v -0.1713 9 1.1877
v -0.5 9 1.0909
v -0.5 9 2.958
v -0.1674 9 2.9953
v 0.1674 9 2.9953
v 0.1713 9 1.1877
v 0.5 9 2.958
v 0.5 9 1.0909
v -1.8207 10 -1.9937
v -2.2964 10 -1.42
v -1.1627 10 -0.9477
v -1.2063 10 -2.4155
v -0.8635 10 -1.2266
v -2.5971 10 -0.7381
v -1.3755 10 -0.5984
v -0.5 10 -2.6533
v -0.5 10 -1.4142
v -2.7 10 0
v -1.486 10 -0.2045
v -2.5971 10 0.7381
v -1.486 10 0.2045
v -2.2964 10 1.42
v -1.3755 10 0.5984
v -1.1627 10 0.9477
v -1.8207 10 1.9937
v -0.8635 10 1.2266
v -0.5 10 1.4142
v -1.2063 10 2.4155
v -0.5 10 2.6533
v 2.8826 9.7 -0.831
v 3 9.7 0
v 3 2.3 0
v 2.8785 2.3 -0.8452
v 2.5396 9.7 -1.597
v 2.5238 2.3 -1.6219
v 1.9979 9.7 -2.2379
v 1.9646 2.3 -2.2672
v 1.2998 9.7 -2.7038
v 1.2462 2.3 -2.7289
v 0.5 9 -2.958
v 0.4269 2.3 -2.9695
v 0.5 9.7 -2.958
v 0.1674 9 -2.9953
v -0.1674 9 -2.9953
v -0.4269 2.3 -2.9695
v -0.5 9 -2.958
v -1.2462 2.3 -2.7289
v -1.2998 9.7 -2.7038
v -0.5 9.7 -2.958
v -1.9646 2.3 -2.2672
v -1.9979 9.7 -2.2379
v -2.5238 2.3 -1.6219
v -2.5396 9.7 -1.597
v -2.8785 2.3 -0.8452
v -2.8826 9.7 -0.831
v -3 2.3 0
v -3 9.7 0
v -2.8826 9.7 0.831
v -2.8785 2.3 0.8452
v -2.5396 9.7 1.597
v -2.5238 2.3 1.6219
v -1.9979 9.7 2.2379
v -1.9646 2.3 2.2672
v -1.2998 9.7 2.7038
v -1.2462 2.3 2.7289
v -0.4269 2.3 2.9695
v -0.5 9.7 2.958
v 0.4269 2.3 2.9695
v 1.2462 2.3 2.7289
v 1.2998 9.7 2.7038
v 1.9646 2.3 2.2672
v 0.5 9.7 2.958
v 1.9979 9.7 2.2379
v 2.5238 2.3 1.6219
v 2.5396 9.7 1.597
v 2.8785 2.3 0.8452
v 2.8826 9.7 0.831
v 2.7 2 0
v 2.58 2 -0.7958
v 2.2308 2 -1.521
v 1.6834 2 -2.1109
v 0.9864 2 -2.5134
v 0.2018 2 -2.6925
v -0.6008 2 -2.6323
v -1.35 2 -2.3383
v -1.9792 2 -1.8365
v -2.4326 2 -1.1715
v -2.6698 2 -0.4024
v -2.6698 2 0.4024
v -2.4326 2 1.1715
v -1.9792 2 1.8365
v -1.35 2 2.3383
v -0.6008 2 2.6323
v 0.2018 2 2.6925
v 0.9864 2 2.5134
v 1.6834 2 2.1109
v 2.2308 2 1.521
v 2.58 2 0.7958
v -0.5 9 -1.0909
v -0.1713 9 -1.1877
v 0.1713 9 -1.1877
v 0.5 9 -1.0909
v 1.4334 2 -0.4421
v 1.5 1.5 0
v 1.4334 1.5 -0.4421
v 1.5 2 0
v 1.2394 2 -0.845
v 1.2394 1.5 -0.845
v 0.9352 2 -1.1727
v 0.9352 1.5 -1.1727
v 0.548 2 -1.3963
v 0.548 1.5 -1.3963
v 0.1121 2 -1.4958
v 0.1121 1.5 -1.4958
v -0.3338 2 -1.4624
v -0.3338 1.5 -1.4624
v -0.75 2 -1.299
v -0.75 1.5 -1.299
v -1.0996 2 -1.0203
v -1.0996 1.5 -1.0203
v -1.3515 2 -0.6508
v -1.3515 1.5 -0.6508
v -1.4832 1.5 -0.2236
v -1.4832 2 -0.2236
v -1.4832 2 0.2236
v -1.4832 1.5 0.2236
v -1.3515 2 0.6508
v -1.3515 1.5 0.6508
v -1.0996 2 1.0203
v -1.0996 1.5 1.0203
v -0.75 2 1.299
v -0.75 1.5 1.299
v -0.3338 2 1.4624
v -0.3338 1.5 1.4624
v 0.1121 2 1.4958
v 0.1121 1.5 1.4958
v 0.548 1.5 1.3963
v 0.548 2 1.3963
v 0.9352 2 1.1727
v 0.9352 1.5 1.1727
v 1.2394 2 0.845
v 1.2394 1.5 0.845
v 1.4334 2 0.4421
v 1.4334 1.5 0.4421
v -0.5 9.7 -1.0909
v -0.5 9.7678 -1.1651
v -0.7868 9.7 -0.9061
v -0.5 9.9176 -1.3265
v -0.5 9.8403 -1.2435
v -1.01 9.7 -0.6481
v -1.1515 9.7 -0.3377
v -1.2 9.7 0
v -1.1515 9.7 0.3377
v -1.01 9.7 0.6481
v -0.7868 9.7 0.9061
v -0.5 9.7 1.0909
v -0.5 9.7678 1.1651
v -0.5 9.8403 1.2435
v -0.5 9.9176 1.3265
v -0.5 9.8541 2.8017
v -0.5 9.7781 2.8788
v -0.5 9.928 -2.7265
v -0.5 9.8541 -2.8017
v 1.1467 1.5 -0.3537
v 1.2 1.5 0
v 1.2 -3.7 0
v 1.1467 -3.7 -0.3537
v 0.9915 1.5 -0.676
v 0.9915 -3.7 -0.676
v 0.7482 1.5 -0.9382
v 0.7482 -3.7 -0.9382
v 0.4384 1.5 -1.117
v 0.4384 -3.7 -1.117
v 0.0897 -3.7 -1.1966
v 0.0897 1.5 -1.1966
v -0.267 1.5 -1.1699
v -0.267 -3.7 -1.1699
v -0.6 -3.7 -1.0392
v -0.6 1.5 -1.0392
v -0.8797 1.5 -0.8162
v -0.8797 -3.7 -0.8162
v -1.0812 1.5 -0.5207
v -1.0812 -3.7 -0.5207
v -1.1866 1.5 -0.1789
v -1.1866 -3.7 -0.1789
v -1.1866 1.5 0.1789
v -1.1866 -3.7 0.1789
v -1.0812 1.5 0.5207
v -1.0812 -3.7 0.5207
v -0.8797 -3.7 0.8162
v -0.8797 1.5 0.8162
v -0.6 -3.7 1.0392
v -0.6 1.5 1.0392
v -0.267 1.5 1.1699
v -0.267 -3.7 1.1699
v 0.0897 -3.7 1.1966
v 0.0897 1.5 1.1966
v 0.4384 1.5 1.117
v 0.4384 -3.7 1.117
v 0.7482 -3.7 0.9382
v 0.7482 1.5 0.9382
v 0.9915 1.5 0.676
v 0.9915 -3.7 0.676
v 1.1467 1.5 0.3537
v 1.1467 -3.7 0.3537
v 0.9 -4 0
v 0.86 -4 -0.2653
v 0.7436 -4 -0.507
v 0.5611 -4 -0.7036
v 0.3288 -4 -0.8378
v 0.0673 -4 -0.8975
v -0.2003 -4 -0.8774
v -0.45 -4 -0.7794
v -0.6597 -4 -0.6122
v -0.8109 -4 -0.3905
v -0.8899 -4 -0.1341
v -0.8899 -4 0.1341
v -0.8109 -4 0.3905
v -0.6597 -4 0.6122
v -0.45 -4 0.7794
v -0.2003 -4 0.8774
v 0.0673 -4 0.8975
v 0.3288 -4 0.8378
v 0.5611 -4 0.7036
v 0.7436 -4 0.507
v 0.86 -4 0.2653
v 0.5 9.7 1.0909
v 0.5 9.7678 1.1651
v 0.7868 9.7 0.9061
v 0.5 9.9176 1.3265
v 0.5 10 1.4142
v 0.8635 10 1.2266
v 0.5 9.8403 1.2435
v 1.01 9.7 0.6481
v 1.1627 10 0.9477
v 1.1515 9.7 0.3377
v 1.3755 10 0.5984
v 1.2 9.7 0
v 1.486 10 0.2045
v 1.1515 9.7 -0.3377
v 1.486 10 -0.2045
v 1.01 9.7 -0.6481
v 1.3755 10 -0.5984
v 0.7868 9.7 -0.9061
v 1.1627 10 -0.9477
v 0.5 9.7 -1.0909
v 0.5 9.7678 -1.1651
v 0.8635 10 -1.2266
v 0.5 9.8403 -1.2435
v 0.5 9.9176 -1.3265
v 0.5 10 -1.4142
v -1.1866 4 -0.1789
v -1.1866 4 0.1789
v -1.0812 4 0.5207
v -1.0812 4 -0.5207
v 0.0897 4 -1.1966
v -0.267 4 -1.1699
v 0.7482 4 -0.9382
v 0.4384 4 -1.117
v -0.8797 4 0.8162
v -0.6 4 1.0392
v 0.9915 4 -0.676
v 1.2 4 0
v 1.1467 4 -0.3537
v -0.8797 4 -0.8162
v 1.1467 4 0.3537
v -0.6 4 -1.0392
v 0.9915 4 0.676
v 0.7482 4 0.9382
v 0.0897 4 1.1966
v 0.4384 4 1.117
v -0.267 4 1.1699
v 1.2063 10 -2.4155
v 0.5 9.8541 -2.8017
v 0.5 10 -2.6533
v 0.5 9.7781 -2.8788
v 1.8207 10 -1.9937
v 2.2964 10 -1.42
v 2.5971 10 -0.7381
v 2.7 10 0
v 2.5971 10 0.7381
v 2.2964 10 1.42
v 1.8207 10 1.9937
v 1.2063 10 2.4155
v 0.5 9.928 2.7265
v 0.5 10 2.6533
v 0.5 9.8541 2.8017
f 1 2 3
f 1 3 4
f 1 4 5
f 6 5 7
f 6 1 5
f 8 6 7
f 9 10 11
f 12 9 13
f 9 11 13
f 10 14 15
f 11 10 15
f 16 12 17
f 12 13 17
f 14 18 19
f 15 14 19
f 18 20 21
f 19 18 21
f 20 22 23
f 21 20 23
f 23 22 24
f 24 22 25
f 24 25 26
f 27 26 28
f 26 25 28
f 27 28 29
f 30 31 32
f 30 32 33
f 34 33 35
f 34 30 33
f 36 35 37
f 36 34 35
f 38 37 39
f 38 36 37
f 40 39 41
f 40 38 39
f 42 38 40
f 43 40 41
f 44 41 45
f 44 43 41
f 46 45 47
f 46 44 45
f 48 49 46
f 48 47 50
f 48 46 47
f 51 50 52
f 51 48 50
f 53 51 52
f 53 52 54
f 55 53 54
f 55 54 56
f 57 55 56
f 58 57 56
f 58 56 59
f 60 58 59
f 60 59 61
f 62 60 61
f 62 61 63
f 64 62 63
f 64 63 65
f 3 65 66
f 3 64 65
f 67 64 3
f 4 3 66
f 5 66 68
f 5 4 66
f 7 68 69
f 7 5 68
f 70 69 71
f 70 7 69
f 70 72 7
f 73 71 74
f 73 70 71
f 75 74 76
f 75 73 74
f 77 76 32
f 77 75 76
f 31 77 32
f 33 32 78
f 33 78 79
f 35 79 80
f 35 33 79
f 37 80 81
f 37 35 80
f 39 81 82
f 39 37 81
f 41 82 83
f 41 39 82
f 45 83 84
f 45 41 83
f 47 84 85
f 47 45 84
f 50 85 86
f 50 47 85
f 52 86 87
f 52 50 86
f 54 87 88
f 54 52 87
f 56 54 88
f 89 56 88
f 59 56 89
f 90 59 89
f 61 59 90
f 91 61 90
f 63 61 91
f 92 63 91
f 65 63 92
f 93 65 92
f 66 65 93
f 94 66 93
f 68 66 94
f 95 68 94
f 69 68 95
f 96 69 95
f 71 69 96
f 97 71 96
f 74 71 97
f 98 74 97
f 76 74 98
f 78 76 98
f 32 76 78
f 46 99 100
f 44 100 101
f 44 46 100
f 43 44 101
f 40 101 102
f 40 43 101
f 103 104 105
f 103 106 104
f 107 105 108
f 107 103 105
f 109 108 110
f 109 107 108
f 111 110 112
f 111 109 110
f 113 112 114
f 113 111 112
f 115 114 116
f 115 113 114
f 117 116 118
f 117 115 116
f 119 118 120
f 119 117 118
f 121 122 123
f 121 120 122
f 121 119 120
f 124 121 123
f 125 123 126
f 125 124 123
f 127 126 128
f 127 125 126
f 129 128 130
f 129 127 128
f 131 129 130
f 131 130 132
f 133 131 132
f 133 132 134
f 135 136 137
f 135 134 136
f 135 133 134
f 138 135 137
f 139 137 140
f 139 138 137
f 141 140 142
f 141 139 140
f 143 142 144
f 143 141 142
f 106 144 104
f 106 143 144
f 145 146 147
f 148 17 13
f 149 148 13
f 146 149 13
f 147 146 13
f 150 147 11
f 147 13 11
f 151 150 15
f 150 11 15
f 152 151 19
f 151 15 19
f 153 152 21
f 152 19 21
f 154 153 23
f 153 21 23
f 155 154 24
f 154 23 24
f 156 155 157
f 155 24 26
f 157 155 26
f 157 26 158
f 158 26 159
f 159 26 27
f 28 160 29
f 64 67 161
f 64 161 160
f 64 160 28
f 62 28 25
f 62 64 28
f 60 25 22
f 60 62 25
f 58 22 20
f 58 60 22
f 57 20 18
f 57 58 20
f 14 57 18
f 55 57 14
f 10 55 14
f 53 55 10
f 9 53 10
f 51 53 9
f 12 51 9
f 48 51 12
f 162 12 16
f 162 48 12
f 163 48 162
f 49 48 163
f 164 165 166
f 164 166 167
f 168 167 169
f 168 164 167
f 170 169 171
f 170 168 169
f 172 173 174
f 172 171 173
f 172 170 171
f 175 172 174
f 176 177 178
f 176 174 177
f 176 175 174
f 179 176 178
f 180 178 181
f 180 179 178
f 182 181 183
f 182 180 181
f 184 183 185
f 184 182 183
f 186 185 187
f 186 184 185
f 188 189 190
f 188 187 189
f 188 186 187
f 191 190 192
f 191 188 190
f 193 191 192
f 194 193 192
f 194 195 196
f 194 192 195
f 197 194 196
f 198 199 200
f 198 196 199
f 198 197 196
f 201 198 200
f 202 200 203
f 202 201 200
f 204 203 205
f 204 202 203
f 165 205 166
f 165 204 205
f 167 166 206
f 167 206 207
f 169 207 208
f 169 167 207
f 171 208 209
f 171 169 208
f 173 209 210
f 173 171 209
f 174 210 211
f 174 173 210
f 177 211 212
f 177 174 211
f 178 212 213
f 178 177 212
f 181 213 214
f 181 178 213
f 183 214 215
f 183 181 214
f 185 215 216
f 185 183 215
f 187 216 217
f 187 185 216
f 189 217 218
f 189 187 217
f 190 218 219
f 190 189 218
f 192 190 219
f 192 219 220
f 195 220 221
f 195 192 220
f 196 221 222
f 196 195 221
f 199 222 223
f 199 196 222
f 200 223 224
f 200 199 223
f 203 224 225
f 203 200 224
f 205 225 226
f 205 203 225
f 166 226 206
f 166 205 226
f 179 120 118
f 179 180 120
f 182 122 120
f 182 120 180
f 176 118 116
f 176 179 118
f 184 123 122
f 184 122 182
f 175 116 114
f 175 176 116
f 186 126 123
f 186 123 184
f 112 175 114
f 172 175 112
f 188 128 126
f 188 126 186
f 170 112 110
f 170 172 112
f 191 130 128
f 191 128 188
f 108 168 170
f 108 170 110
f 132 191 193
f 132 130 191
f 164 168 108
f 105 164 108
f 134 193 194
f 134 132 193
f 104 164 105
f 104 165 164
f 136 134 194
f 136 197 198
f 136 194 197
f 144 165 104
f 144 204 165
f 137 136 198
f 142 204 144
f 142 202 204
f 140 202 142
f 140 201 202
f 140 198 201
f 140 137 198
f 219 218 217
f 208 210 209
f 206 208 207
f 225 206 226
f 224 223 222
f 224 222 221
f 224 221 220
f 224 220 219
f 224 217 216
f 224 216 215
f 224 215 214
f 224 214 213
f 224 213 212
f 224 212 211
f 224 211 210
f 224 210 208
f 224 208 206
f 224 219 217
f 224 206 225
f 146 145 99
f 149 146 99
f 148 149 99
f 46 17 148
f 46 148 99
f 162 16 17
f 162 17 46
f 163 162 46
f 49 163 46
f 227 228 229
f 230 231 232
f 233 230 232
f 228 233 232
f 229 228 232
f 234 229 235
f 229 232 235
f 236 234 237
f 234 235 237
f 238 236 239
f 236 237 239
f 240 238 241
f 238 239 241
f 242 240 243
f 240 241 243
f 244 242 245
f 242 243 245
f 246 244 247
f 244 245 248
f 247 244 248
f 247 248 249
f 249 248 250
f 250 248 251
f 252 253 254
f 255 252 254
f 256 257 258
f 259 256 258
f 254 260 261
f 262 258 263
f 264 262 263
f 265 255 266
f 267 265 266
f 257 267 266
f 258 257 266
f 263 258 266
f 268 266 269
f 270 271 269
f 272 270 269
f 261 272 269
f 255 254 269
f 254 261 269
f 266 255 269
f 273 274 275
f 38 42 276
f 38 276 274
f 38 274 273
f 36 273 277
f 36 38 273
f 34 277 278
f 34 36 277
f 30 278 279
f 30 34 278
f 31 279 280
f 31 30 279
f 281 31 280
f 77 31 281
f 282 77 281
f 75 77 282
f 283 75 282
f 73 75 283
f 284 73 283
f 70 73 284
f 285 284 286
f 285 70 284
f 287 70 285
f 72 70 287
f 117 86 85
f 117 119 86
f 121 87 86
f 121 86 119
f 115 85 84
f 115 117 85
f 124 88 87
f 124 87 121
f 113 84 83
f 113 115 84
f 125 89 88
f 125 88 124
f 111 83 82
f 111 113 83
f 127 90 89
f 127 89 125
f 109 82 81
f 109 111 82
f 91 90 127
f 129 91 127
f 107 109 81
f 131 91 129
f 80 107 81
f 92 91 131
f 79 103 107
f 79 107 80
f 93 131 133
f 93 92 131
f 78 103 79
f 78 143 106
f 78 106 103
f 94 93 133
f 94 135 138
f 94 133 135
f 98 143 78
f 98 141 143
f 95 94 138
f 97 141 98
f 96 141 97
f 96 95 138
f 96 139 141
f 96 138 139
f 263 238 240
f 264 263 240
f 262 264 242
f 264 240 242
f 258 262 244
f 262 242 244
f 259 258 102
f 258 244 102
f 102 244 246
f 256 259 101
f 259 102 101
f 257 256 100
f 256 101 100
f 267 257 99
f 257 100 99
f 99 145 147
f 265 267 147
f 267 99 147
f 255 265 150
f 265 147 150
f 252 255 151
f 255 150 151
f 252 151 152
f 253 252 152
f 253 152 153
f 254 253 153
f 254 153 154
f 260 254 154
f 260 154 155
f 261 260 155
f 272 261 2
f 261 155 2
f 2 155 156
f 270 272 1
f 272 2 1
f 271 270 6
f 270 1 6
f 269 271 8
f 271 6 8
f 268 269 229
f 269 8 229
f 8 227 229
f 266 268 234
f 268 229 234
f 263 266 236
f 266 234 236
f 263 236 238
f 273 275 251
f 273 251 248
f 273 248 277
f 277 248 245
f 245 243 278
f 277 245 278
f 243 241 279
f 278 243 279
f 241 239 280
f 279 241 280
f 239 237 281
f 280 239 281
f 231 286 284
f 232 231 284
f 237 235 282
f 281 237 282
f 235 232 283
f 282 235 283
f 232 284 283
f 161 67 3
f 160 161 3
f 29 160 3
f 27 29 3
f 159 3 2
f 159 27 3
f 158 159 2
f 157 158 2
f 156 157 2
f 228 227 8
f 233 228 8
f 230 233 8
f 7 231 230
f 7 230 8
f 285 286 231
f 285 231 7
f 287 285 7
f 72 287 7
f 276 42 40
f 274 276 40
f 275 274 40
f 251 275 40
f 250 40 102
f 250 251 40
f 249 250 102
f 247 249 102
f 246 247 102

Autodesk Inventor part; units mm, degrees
ref_plane "YZ Plane" through (0, 0, 0) normal (1, 0, 0) x (0, 1, 0)
ref_plane "XZ Plane" through (0, 0, 0) normal (0, 1, 0) x (-1, 0, 0)
ref_plane "XY Plane" through (0, 0, 0) normal (0, 0, 1) x (1, 0, 0)
sketch "スケッチ1" plane through (0, 0, 0) normal (0, 0, 1) x (1, 0, 0)
  line L0 (0, -4) -> (0.9, -4)
  line L1 (0.9, -4) -> (1.2, -3.7)
  line L2 (1.2, -3.7) -> (1.2, 1.5)
  line L3 (1.2, 1.5) -> (1.5, 1.5)
  line L4 (1.5, 1.5) -> (1.5, 2)
  line L5 (1.5, 2) -> (2.7, 2)
  line L6 (3, 9.7) -> (2.7, 10)
  line L7 (2.7, 10) -> (1.5, 10)
  line L8 (1.5, 10) -> (1.2, 9.7)
  line L9 (0, 7.4044) -> (0, -7.4044) construction
  line L10 (0, -4) -> (0, 4)
  line L11 (0, 4) -> (1.2, 4)
  line L12 (1.2, 4) -> (1.2, 9.7)
  line L13 (2.7, 2) -> (3, 2.3)
  line L14 (3, 2.3) -> (3, 9.7)
  point P0 (0, 0)
  point P1 (0, 0)
  point P2 (0, 0)
  dimension "d0" = 2.4
  dimension "d1" = 6
  dimension "d2" = 0.3
  dimension "d3" = 0.3
  dimension "d4" = 3
  dimension "d5" = 0.5
  dimension "d6" = 8
  dimension "d7" = 0.3
  dimension "d8" = 2.4
  dimension "d9" = 6
  dimension "d10" = 0.3
  dimension "d11" = 0.3
  dimension "d12" = 0.3
  dimension "d13" = 0.3
  dimension "d14" = 6
revolve "回転1" add sketch "スケッチ1" angle 360 about axis through (0, 7.4044, 0) along (0, -1, 0)
sketch "スケッチ2" plane through (0, 10, 0) normal (0, 1, 0) x (1, 0, 0)
  line L0 (-0.5, 3) -> (0.5, 3)
  line L1 (0.5, 3) -> (0.5, -3)
  line L2 (0.5, -3) -> (-0.5, -3)
  line L3 (-0.5, -3) -> (-0.5, 3)
  line L4 (-0.5, 3) -> (0.5, -3) construction
  line L5 (0.5, 3) -> (-0.5, -3) construction
  circle A0 centre (0, 0) radius 3 projected
  point P0 (0, 0)
  point P1 (0.5, 2.958)
  point P2 (-0.5, 2.958)
  point P3 (-0.5, -2.958)
  point P4 (0.5, -2.958)
  dimension "d16" = 1
extrude "押し出し1" cut sketch "スケッチ2" against normal blind 1 contours A0 L1 L3
equation "\"d3\" = d2"
equation "\"d10\" = d7"
equation "\"d11\" = d7"
equation "\"d12\" = d11"
equation "\"d13\" = d12"
properties part number "BRU-307S" material "ステンレス鋼 AISI 304"
